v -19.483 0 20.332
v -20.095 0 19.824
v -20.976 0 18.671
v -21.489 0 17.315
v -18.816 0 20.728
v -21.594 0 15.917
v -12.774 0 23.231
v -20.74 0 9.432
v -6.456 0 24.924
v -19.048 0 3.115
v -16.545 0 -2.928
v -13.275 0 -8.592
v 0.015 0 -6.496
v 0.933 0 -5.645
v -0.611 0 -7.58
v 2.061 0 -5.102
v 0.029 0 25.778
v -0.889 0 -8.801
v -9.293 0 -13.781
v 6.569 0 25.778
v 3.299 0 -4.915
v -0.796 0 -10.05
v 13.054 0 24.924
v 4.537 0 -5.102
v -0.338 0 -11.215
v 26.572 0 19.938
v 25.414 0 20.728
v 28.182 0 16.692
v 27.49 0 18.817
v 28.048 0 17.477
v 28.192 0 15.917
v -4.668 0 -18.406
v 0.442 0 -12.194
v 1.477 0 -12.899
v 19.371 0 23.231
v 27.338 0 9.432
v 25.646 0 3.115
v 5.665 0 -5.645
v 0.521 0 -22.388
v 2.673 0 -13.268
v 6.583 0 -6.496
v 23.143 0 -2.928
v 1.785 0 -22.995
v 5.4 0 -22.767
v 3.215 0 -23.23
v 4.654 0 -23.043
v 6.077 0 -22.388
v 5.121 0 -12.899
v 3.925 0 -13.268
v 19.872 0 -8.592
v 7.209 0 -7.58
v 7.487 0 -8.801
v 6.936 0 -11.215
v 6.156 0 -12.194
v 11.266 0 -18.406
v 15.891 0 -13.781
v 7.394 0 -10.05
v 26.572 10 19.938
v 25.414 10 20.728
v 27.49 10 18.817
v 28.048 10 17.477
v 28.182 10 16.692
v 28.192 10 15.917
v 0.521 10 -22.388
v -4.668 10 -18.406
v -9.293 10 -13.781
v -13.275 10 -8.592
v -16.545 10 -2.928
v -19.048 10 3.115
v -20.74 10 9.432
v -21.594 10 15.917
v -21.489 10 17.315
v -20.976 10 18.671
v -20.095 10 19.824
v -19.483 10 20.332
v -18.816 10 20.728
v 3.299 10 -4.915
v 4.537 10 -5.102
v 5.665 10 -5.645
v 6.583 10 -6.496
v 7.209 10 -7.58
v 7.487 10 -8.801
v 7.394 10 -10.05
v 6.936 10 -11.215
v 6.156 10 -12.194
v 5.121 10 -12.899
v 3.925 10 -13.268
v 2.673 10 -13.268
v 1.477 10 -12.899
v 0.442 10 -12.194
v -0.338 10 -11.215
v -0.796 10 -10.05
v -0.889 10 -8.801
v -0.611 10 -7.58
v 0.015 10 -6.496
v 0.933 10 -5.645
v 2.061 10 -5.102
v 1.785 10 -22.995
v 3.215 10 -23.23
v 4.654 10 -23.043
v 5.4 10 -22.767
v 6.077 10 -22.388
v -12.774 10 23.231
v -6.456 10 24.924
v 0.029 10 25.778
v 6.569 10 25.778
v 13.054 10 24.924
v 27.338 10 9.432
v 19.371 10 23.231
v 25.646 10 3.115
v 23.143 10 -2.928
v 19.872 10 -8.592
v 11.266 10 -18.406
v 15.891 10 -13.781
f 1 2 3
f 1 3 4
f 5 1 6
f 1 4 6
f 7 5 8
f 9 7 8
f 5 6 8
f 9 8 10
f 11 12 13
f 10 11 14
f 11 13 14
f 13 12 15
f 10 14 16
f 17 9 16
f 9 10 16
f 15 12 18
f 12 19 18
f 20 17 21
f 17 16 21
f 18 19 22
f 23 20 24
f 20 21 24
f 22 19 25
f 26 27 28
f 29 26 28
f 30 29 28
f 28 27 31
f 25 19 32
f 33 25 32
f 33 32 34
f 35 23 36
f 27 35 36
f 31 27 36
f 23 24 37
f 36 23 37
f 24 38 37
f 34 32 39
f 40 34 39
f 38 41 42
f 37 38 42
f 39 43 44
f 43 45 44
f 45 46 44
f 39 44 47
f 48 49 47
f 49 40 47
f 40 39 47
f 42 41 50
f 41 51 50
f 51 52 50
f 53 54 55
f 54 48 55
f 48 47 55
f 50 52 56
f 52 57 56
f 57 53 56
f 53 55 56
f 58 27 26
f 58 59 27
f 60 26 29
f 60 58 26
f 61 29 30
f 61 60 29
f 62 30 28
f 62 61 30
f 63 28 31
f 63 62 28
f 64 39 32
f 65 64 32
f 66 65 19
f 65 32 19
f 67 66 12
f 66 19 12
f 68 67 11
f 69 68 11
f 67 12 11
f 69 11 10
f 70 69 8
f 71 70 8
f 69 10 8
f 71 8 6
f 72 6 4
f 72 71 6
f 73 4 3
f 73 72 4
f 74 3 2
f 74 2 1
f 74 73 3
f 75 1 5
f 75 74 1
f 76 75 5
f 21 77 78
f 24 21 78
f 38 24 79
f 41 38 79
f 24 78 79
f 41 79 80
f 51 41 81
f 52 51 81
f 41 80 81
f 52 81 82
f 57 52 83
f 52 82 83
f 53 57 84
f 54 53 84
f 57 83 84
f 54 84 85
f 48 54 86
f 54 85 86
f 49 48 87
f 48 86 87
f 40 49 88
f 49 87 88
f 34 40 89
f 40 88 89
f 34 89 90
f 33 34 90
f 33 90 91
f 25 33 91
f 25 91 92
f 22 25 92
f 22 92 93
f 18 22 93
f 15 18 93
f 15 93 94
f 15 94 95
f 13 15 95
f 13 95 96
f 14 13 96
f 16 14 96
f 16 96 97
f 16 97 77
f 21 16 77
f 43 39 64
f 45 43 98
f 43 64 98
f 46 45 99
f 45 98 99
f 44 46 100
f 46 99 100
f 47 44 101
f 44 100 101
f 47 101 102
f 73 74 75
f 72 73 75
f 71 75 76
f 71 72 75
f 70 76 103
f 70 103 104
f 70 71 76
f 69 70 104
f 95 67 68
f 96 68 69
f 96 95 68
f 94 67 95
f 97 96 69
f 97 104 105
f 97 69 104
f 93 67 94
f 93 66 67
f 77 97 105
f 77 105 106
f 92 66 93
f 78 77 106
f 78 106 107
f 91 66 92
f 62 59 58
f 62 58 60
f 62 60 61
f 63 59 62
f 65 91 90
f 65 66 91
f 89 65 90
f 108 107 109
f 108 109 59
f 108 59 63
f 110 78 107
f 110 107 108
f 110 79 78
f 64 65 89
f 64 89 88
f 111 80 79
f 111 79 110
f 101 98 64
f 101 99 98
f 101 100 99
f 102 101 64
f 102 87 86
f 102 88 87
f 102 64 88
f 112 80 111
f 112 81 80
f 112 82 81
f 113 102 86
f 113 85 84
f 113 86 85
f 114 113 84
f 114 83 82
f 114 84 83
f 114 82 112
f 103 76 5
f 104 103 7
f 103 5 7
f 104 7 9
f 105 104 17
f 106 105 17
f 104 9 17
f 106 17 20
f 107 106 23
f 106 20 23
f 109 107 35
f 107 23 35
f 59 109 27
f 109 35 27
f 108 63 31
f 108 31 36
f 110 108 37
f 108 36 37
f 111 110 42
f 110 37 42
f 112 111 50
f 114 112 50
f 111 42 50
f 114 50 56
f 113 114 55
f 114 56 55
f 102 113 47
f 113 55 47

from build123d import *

# Parameters (mm, degrees)
EXTRUDE_1_DEPTH     = 10
SKETCH_2_R          = 4.2
CUT_EXTRUDE_1_DEPTH = 40.634142812
FILLET_1_R          = 5
FILLET_2_R          = 5
FILLET_3_R          = 5


with BuildPart() as part:
    # 草图1 → 凸台-拉伸1 (new body)
    with BuildSketch(Plane(origin=(0, 0, 0), x_dir=(1, 0, 0), z_dir=(0, 1, 0))):
        with BuildLine():
            ThreePointArc((-21.701095489, -19.186348515), (3.298904511, -25.885078326), (28.298904511, -19.186348515))
            ThreePointArc((28.298904511, -19.186348515), (21.6001747, 5.813651485), (3.298904511, 24.114921674))
            ThreePointArc((3.298904511, 24.114921674), (-15.002365678, 5.813651485), (-21.701095489, -19.186348515))
        make_face()
    extrude(amount=EXTRUDE_1_DEPTH)

    # 草图2 → 切除-拉伸1 (cut, through all)
    with BuildSketch(Plane(origin=(0, 10, 0), x_dir=(1, 0, 0), z_dir=(0, 1, 0))):
        with Locations(Location((3.298904511, 9.114921674, 0), (0, 0, 270))):
            Circle(SKETCH_2_R)
    extrude(amount=-CUT_EXTRUDE_1_DEPTH, mode=Mode.SUBTRACT)

    # 圆角1
    fillet_1_edges = [part.edges().sort_by_distance(p)[0] for p in [
        (3.298904511, 5, -24.114921674),
    ]]
    fillet(fillet_1_edges, radius=FILLET_1_R)

    # 圆角2
    fillet_2_edges = [part.edges().sort_by_distance(p)[0] for p in [
        (-21.701095489, 5, 19.186348515),
    ]]
    fillet(fillet_2_edges, radius=FILLET_2_R)

    # 圆角3
    fillet_3_edges = [part.edges().sort_by_distance(p)[0] for p in [
        (28.298904511, 5, 19.186348515),
    ]]
    fillet(fillet_3_edges, radius=FILLET_3_R)


solid = part.part
